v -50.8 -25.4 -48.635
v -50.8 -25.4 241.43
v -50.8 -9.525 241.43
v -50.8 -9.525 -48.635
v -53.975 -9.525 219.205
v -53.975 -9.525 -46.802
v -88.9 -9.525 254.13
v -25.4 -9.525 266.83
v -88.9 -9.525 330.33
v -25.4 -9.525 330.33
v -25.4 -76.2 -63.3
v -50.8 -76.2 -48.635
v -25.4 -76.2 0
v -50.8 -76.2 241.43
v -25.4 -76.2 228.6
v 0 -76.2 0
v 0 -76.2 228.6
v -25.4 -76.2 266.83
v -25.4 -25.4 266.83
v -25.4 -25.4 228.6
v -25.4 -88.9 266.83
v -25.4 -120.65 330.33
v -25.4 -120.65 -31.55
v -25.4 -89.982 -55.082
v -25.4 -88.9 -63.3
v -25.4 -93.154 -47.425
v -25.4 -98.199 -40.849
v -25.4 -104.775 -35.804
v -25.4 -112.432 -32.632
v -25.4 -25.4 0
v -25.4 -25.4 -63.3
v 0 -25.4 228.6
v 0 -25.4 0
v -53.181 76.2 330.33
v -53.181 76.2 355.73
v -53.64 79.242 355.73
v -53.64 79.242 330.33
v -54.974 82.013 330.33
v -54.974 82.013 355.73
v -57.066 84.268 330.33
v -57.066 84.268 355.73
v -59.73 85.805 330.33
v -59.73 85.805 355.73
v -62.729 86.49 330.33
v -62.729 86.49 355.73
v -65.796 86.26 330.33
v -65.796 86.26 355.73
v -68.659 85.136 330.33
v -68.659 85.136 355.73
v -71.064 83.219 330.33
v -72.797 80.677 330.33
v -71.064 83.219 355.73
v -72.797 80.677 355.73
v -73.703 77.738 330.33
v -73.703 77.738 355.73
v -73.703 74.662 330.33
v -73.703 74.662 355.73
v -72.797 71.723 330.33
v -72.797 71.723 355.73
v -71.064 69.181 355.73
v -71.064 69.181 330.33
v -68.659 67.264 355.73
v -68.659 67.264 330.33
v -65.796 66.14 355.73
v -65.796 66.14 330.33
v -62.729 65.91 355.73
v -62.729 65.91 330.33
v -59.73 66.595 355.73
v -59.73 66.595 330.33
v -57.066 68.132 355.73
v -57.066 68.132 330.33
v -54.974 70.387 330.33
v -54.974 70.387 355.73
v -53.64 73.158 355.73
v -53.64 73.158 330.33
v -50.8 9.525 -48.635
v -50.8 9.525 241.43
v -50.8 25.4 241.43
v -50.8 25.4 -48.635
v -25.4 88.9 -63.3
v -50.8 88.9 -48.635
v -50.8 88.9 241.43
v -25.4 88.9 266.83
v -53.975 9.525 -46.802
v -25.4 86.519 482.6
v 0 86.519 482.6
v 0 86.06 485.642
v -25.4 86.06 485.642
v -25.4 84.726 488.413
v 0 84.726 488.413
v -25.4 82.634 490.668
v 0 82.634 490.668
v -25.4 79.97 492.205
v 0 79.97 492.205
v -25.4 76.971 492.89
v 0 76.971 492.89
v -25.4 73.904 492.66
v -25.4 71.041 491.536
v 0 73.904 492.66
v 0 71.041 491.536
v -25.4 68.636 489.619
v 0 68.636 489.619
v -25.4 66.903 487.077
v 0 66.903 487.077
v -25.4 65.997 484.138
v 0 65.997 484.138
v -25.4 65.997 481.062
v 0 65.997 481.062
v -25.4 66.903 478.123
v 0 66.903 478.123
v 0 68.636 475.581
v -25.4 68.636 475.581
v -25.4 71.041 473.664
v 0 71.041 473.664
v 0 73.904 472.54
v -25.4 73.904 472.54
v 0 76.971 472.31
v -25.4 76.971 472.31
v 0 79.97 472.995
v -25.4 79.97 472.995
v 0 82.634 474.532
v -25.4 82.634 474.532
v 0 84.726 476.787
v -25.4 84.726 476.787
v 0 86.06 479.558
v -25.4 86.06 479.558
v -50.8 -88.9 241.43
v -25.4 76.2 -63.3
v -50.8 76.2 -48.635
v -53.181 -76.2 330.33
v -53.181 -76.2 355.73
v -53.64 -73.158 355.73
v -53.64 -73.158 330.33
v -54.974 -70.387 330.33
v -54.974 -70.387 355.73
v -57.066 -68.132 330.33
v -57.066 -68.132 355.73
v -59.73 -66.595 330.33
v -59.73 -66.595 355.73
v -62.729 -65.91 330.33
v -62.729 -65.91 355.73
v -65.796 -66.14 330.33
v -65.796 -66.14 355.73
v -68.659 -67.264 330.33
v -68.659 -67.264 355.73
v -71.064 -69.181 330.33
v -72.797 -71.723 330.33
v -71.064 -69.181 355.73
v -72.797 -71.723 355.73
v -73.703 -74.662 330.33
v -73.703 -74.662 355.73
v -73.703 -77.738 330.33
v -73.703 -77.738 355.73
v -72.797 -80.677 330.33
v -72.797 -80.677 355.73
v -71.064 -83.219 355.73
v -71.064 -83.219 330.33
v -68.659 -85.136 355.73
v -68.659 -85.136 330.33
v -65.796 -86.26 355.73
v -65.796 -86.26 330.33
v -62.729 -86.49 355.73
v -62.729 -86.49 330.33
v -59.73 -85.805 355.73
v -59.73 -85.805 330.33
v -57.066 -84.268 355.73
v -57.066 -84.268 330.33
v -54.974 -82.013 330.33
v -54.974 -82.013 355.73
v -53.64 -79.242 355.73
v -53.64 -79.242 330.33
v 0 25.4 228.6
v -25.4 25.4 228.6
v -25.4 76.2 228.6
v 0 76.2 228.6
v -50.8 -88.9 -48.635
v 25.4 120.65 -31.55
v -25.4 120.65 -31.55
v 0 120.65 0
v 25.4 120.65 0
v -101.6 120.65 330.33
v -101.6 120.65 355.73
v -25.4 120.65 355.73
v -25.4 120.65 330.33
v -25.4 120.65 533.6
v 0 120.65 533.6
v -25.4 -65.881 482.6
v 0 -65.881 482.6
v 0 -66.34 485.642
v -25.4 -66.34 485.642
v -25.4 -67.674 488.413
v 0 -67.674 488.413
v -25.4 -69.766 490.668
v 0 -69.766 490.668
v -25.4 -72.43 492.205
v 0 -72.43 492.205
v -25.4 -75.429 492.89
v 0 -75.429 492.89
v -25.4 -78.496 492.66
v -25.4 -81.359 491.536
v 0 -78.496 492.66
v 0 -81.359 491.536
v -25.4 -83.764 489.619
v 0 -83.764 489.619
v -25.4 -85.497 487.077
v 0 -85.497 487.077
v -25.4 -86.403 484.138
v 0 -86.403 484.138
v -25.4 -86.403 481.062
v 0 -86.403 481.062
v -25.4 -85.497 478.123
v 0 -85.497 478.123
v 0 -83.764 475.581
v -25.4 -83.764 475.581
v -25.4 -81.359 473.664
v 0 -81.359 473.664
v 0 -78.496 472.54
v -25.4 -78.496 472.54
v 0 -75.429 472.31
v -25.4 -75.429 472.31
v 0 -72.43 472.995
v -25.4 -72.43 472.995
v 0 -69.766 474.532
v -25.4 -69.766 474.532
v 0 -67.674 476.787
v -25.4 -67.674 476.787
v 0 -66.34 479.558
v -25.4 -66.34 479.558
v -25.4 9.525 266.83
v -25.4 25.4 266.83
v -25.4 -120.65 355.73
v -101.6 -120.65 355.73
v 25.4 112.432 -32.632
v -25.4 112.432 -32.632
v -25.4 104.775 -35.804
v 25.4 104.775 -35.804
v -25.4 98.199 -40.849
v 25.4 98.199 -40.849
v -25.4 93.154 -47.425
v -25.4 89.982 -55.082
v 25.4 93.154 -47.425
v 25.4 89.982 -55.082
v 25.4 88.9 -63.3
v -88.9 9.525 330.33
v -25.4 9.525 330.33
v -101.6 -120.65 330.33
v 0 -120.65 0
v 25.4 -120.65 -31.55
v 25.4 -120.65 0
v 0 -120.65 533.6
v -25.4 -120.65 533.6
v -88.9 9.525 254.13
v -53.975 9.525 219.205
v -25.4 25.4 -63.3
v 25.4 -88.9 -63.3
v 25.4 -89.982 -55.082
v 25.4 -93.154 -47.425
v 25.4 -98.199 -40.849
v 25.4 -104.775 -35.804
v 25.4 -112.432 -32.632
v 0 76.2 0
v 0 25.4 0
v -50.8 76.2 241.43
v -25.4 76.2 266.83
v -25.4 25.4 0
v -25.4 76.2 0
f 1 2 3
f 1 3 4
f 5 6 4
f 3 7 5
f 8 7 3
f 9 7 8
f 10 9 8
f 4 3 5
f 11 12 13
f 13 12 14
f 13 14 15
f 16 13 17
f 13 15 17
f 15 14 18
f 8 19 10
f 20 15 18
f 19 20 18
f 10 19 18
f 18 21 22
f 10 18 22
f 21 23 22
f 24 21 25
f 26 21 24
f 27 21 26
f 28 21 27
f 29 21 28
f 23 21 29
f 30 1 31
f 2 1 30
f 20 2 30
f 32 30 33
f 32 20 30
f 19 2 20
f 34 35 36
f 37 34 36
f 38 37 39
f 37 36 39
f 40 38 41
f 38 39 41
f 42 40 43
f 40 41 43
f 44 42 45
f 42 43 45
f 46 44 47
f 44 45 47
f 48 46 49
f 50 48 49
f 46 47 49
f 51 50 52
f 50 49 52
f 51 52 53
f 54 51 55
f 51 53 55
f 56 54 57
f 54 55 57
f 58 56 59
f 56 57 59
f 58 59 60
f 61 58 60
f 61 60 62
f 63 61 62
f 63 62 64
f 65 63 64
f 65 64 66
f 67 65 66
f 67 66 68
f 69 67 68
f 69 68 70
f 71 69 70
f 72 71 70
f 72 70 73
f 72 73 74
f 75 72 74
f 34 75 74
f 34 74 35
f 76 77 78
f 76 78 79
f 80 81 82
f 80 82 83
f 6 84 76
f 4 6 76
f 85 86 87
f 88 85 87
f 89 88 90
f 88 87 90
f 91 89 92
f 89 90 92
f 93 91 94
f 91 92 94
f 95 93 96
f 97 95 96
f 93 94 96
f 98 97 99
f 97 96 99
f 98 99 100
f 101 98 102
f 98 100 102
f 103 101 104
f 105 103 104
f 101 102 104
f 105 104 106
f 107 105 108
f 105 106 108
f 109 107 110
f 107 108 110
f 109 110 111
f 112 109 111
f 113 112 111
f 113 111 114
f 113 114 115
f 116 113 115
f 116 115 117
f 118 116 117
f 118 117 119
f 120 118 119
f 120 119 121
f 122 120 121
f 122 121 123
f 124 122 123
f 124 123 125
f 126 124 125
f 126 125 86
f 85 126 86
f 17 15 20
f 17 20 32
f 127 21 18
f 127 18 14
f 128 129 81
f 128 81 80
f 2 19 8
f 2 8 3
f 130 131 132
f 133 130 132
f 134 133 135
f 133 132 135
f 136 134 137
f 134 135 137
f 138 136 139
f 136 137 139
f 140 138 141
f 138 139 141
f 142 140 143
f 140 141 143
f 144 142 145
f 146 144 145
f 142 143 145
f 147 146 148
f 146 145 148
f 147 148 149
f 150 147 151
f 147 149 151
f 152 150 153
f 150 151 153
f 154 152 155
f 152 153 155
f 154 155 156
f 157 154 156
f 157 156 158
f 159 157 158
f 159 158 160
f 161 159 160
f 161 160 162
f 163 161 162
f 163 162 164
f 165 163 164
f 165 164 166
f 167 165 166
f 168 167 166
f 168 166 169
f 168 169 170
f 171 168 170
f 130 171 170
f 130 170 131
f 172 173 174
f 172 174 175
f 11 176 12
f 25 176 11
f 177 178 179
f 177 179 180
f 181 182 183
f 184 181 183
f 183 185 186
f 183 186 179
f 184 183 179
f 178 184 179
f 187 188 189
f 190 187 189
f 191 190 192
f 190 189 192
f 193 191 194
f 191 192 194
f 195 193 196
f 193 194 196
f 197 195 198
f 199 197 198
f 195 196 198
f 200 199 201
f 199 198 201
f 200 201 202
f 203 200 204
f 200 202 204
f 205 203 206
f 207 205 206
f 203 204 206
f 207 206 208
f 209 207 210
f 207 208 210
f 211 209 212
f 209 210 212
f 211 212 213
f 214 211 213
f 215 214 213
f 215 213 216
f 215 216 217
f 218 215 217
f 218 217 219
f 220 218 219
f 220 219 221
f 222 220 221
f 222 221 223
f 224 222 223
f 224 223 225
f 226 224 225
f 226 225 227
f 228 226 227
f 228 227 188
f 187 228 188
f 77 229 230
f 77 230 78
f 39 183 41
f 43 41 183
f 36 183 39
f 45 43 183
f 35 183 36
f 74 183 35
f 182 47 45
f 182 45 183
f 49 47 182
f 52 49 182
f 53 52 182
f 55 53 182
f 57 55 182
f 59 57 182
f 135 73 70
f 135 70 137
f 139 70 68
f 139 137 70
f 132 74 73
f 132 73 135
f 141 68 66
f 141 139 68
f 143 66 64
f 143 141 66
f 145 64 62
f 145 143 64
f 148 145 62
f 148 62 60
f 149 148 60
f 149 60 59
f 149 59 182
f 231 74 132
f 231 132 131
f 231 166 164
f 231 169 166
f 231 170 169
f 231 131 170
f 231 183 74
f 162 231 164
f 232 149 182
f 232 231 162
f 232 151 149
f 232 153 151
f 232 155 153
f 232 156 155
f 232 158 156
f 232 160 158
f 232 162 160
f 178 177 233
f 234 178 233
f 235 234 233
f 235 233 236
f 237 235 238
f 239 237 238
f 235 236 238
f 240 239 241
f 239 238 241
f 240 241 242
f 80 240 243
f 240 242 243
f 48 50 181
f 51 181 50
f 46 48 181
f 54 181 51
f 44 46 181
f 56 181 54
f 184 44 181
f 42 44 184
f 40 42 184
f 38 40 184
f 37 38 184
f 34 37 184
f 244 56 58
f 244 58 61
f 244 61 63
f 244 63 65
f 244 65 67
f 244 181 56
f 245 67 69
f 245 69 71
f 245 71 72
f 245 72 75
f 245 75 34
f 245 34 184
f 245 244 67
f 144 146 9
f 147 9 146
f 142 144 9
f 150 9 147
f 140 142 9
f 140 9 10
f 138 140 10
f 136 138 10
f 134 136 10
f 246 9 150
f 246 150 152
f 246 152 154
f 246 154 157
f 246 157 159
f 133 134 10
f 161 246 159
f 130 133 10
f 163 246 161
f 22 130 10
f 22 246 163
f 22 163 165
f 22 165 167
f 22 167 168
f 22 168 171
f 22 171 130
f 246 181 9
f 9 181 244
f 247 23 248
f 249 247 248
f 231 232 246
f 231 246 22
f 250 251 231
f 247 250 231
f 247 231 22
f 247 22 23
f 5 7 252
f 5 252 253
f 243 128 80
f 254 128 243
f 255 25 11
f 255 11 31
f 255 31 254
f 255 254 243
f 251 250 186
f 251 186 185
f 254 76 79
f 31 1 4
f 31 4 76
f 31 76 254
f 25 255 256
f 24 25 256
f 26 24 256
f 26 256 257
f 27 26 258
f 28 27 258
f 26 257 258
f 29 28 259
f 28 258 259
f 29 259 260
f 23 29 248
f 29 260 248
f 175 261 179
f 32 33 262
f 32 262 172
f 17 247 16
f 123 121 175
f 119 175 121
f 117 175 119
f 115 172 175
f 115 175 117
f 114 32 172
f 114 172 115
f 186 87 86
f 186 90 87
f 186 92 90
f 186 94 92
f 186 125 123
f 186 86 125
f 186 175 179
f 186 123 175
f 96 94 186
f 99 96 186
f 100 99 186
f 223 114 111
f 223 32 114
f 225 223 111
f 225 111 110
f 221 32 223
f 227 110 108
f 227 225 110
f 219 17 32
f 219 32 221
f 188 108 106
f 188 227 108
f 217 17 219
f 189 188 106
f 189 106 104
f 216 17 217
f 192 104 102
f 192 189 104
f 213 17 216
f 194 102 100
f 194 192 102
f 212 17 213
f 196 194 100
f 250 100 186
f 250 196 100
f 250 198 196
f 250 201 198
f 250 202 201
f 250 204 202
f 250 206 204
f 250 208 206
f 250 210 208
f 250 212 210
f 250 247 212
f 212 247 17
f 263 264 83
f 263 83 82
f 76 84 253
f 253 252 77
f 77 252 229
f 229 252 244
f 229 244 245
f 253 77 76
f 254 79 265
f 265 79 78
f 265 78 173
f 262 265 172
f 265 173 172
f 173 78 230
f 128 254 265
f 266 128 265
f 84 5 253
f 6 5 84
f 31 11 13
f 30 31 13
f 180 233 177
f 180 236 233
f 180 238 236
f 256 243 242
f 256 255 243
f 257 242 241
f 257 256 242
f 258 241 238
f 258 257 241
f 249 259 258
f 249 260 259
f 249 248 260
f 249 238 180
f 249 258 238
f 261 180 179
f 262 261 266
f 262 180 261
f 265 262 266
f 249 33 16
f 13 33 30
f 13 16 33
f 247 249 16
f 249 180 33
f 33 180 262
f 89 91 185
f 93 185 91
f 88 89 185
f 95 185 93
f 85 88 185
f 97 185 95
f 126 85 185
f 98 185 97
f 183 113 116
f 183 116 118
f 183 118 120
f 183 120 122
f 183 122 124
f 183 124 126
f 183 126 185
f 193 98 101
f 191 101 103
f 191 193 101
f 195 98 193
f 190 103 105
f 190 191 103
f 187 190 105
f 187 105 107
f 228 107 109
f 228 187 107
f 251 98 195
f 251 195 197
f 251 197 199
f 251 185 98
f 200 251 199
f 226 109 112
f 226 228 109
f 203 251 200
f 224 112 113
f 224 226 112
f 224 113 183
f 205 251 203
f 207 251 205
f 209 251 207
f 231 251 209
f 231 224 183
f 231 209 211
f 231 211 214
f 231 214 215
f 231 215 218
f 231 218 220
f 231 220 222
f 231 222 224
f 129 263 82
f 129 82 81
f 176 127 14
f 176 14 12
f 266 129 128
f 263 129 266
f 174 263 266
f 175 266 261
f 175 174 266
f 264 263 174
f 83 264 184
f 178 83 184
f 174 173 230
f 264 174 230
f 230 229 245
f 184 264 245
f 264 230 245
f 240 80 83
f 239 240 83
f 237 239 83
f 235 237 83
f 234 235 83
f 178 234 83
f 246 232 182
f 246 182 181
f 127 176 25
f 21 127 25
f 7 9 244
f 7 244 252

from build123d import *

# Parameters (mm, degrees)
F0_W      = 25.4
F0_H      = 228.6
F1_DEPTH  = 120.65
F2_DEPTH  = 76.2
F3_DEPTH  = 25.4
F4_R      = 10.31875
F5_DEPTH  = 101.601
F7_DEPTH  = 127.001
F9_DEPTH  = 88.9
F10_DEPTH = 76.2
F11_DEPTH = 25.4
F12_DEPTH = 9.525
F13_R     = 10.31875
F14_DEPTH = 419.031


with BuildPart() as f1:
    # F0 (on Front) → F1 (new body, symmetric)
    with BuildSketch(Plane.XZ):
        with Locations((-12.7, 114.3)):
            Rectangle(F0_W, F0_H)
        Polygon((-25.4, 228.6), (0, 228.6), (0, 533.6), (-25.4, 533.6), (-25.4, 355.73), (-101.6, 355.73), (-101.6, 330.33), (-25.4, 330.33), align=None)
        Polygon((25.4, 0), (0, 0), (-25.4, 0), (-25.4, -63.3), (25.4, -63.3), align=None)
    extrude(amount=F1_DEPTH, both=True)

    # F0 (on Front) → F2 (cut, symmetric)
    with BuildSketch(Plane.XZ):
        with Locations((-12.7, 114.3)):
            Rectangle(F0_W, F0_H)
    extrude(amount=F2_DEPTH, both=True, mode=Mode.SUBTRACT)

    # F0 (on Front) → F3 (join, symmetric)
    with BuildSketch(Plane.XZ):
        with Locations((-12.7, 114.3)):
            Rectangle(F0_W, F0_H)
    extrude(amount=F3_DEPTH, both=True)

    # F4 (on face) → F5 (cut, through all)
    with BuildSketch(Plane.YZ):
        with Locations((-76.2, 482.6)):
            Circle(F4_R)
        with Locations((76.2, 482.6)):
            Circle(F4_R)
    extrude(amount=-F5_DEPTH, mode=Mode.SUBTRACT)

    # F6 (on face) → F7 (cut, through all)
    with BuildSketch(Plane.YZ.offset(25.4)):
        with BuildLine():
            Line((-120.65, -63.3), (-88.9, -63.3))
            ThreePointArc((-88.9, -63.3), (-98.1993596973, -40.8493596973), (-120.65, -31.55))
            Line((-120.65, -31.55), (-120.65, -63.3))
        make_face()
        with BuildLine():
            ThreePointArc((120.65, -31.55), (98.1993596973, -40.8493596973), (88.9, -63.3))
            Line((88.9, -63.3), (120.65, -63.3))
            Line((120.65, -63.3), (120.65, -31.55))
        make_face()
    extrude(amount=-F7_DEPTH, mode=Mode.SUBTRACT)

    # F8 (on Front) → F9 (join, symmetric)
    with BuildSketch(Plane.XZ):
        Polygon((-50.8, -48.6353031626), (-25.4, -63.3), (-25.4, 266.83), (-50.8, 241.43), (-50.8, 216.03), align=None)
    extrude(amount=F9_DEPTH, both=True)

    # F8 (on Front) → F10 (cut, symmetric)
    with BuildSketch(Plane.XZ):
        Polygon((-50.8, -48.6353031626), (-25.4, -63.3), (-25.4, 266.83), (-50.8, 241.43), (-50.8, 216.03), align=None)
    extrude(amount=F10_DEPTH, both=True, mode=Mode.SUBTRACT)

    # F8 (on Front) → F11 (join, symmetric)
    with BuildSketch(Plane.XZ):
        Polygon((-50.8, -48.6353031626), (-25.4, -63.3), (-25.4, 266.83), (-50.8, 241.43), (-50.8, 216.03), align=None)
    extrude(amount=F11_DEPTH, both=True)

    # F8 (on Front) → F12 (join, symmetric)
    with BuildSketch(Plane.XZ):
        Polygon((-50.8, 241.43), (-25.4, 266.83), (-25.4, 330.33), (-88.9, 330.33), (-88.9, 254.13), (-53.975, 219.205), (-50.8, 216.03), align=None)
        Polygon((-53.975, -46.8022160579), (-50.8, -48.6353031626), (-50.8, 216.03), (-53.975, 219.205), align=None)
    extrude(amount=F12_DEPTH, both=True)

    # F13 (on face) → F14 (cut, through all)
    with BuildSketch(Plane.XY.offset(355.73)):
        with Locations((-63.5, 76.2)):
            Circle(F13_R)
        with Locations((-63.5, -76.2)):
            Circle(F13_R)
    extrude(amount=-F14_DEPTH, mode=Mode.SUBTRACT)


solid = f1.part
